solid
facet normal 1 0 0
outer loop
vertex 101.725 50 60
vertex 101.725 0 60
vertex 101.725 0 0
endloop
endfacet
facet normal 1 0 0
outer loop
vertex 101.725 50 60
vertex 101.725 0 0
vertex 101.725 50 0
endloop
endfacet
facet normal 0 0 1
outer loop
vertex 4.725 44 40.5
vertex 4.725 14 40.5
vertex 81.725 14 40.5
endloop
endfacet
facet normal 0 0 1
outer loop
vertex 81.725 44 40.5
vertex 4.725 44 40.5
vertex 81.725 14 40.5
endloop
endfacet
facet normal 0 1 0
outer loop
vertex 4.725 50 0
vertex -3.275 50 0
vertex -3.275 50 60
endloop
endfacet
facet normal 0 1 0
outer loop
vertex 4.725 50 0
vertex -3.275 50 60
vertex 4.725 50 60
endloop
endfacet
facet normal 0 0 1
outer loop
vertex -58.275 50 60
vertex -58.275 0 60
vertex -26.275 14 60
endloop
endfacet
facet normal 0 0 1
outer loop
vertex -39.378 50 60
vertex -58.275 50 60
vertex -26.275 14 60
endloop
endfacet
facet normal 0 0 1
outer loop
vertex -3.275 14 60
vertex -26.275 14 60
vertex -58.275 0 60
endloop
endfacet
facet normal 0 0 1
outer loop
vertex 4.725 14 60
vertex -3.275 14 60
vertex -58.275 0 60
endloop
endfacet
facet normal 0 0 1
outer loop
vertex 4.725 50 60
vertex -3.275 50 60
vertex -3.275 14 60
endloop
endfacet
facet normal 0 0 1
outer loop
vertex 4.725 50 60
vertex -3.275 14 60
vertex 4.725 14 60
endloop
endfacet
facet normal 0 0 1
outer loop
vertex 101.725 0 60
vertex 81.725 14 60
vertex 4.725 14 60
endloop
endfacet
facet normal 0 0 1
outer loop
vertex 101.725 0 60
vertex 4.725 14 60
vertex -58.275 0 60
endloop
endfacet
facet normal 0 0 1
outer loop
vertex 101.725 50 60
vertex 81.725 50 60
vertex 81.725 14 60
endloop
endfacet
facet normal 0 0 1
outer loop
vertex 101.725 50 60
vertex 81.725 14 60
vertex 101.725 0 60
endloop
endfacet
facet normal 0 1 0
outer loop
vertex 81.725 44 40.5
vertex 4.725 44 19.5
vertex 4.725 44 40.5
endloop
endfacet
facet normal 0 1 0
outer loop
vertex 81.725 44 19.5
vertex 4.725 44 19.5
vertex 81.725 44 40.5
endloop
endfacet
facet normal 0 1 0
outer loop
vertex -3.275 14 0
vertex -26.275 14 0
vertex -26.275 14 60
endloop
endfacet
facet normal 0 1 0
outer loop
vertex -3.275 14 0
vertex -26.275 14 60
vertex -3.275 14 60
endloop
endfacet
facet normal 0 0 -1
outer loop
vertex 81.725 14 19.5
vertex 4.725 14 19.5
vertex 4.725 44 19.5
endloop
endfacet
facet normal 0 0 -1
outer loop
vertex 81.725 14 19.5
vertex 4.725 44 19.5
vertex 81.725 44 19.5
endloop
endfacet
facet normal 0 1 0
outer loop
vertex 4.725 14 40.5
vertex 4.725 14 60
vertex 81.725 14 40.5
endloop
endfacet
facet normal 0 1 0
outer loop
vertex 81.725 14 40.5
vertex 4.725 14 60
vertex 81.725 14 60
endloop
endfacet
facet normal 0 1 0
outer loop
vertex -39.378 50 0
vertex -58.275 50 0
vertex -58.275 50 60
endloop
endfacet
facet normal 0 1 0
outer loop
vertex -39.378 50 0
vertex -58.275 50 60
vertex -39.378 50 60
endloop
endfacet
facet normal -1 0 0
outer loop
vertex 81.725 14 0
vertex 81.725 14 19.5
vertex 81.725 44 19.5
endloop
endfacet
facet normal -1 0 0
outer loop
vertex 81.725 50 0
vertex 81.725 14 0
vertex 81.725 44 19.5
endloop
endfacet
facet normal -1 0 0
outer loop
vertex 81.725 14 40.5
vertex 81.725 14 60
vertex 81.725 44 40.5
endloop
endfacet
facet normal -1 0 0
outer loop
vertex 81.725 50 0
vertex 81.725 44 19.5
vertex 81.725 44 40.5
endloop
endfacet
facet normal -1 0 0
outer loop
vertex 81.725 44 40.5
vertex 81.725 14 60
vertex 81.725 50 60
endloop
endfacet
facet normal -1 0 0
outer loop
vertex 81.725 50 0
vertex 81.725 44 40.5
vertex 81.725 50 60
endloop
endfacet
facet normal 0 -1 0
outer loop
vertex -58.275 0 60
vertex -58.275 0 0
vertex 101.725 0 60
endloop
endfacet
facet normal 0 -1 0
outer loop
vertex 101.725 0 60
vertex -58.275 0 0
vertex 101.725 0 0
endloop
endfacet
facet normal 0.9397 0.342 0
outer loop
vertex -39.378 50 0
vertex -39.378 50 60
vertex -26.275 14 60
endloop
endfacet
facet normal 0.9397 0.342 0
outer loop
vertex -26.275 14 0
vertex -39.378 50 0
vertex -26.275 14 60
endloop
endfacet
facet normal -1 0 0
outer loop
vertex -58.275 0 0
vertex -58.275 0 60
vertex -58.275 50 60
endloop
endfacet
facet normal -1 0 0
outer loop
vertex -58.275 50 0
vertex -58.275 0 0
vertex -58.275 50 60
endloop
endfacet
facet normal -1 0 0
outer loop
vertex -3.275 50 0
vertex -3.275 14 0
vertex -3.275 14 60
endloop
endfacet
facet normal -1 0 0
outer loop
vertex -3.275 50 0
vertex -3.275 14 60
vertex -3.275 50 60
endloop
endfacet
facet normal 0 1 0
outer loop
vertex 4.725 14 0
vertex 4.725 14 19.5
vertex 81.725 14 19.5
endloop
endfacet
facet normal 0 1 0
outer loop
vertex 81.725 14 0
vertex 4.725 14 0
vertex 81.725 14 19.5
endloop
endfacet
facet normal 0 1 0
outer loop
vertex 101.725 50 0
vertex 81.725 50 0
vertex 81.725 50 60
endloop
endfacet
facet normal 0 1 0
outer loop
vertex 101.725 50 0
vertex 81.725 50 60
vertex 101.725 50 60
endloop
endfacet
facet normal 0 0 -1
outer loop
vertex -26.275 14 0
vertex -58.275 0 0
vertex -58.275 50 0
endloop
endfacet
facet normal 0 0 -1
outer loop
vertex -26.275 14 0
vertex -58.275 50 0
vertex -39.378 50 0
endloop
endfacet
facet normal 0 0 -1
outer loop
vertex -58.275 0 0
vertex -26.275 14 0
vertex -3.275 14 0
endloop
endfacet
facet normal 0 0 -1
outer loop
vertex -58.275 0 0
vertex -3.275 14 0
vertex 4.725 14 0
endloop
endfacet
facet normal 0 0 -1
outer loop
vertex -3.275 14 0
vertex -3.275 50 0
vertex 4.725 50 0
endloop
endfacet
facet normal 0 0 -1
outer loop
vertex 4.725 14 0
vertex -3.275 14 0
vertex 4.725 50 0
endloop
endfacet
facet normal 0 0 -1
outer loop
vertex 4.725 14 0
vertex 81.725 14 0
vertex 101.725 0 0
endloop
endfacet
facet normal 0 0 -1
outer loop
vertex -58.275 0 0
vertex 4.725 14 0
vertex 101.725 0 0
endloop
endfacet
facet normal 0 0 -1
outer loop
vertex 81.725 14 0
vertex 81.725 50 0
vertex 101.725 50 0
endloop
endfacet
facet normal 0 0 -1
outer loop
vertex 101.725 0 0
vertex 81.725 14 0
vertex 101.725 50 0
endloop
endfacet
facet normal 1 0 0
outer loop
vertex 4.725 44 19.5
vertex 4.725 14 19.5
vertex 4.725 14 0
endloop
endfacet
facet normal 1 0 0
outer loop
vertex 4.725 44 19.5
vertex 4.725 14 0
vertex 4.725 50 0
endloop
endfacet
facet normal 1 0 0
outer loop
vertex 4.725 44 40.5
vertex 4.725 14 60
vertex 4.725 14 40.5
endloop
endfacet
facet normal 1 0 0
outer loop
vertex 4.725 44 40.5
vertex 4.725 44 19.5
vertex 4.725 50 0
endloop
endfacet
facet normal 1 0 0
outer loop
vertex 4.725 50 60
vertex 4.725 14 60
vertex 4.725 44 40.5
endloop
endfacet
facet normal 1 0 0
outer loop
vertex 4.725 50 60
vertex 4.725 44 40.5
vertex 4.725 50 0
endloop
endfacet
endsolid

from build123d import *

# Parameters (mm, degrees)
SKETCH2_W           = 160
SKETCH2_H           = 50
BOSS_EXTRUDE1_DEPTH = 60
CUT_EXTRUDE1_DEPTH  = 61
SKETCH4_W           = 77
SKETCH4_H           = 36
CUT_EXTRUDE3_DEPTH  = 61
SKETCH9_W           = 77
SKETCH9_H           = 21
BOSS_EXTRUDE4_DEPTH = 30


with BuildPart() as part:
    # Sketch2 → Boss-Extrude1 (new body)
    with BuildSketch(Plane.XY):
        with Locations((21.725, 25)):
            Rectangle(SKETCH2_W, SKETCH2_H)
    extrude(amount=BOSS_EXTRUDE1_DEPTH)

    # Sketch3 → Cut-Extrude1 (cut, through all)
    with BuildSketch(Plane.XY.offset(60)):
        Polygon((-39.377928434, 50), (-26.275, 14), (-3.275, 14), (-3.275, 50), align=None)
    extrude(amount=-CUT_EXTRUDE1_DEPTH, mode=Mode.SUBTRACT)

    # Sketch4 → Cut-Extrude3 (cut, through all)
    with BuildSketch(Plane.XY.offset(60)):
        with Locations((43.225, 32)):
            Rectangle(SKETCH4_W, SKETCH4_H)
    extrude(amount=-CUT_EXTRUDE3_DEPTH, mode=Mode.SUBTRACT)

    # Sketch9 → Boss-Extrude4 (add)
    with BuildSketch(Plane(origin=(0, 14, 0), x_dir=(1, 0, 0), z_dir=(0, 1, 0))):
        with Locations((43.225, -30)):
            Rectangle(SKETCH9_W, SKETCH9_H)
    extrude(amount=BOSS_EXTRUDE4_DEPTH)


solid = part.part
